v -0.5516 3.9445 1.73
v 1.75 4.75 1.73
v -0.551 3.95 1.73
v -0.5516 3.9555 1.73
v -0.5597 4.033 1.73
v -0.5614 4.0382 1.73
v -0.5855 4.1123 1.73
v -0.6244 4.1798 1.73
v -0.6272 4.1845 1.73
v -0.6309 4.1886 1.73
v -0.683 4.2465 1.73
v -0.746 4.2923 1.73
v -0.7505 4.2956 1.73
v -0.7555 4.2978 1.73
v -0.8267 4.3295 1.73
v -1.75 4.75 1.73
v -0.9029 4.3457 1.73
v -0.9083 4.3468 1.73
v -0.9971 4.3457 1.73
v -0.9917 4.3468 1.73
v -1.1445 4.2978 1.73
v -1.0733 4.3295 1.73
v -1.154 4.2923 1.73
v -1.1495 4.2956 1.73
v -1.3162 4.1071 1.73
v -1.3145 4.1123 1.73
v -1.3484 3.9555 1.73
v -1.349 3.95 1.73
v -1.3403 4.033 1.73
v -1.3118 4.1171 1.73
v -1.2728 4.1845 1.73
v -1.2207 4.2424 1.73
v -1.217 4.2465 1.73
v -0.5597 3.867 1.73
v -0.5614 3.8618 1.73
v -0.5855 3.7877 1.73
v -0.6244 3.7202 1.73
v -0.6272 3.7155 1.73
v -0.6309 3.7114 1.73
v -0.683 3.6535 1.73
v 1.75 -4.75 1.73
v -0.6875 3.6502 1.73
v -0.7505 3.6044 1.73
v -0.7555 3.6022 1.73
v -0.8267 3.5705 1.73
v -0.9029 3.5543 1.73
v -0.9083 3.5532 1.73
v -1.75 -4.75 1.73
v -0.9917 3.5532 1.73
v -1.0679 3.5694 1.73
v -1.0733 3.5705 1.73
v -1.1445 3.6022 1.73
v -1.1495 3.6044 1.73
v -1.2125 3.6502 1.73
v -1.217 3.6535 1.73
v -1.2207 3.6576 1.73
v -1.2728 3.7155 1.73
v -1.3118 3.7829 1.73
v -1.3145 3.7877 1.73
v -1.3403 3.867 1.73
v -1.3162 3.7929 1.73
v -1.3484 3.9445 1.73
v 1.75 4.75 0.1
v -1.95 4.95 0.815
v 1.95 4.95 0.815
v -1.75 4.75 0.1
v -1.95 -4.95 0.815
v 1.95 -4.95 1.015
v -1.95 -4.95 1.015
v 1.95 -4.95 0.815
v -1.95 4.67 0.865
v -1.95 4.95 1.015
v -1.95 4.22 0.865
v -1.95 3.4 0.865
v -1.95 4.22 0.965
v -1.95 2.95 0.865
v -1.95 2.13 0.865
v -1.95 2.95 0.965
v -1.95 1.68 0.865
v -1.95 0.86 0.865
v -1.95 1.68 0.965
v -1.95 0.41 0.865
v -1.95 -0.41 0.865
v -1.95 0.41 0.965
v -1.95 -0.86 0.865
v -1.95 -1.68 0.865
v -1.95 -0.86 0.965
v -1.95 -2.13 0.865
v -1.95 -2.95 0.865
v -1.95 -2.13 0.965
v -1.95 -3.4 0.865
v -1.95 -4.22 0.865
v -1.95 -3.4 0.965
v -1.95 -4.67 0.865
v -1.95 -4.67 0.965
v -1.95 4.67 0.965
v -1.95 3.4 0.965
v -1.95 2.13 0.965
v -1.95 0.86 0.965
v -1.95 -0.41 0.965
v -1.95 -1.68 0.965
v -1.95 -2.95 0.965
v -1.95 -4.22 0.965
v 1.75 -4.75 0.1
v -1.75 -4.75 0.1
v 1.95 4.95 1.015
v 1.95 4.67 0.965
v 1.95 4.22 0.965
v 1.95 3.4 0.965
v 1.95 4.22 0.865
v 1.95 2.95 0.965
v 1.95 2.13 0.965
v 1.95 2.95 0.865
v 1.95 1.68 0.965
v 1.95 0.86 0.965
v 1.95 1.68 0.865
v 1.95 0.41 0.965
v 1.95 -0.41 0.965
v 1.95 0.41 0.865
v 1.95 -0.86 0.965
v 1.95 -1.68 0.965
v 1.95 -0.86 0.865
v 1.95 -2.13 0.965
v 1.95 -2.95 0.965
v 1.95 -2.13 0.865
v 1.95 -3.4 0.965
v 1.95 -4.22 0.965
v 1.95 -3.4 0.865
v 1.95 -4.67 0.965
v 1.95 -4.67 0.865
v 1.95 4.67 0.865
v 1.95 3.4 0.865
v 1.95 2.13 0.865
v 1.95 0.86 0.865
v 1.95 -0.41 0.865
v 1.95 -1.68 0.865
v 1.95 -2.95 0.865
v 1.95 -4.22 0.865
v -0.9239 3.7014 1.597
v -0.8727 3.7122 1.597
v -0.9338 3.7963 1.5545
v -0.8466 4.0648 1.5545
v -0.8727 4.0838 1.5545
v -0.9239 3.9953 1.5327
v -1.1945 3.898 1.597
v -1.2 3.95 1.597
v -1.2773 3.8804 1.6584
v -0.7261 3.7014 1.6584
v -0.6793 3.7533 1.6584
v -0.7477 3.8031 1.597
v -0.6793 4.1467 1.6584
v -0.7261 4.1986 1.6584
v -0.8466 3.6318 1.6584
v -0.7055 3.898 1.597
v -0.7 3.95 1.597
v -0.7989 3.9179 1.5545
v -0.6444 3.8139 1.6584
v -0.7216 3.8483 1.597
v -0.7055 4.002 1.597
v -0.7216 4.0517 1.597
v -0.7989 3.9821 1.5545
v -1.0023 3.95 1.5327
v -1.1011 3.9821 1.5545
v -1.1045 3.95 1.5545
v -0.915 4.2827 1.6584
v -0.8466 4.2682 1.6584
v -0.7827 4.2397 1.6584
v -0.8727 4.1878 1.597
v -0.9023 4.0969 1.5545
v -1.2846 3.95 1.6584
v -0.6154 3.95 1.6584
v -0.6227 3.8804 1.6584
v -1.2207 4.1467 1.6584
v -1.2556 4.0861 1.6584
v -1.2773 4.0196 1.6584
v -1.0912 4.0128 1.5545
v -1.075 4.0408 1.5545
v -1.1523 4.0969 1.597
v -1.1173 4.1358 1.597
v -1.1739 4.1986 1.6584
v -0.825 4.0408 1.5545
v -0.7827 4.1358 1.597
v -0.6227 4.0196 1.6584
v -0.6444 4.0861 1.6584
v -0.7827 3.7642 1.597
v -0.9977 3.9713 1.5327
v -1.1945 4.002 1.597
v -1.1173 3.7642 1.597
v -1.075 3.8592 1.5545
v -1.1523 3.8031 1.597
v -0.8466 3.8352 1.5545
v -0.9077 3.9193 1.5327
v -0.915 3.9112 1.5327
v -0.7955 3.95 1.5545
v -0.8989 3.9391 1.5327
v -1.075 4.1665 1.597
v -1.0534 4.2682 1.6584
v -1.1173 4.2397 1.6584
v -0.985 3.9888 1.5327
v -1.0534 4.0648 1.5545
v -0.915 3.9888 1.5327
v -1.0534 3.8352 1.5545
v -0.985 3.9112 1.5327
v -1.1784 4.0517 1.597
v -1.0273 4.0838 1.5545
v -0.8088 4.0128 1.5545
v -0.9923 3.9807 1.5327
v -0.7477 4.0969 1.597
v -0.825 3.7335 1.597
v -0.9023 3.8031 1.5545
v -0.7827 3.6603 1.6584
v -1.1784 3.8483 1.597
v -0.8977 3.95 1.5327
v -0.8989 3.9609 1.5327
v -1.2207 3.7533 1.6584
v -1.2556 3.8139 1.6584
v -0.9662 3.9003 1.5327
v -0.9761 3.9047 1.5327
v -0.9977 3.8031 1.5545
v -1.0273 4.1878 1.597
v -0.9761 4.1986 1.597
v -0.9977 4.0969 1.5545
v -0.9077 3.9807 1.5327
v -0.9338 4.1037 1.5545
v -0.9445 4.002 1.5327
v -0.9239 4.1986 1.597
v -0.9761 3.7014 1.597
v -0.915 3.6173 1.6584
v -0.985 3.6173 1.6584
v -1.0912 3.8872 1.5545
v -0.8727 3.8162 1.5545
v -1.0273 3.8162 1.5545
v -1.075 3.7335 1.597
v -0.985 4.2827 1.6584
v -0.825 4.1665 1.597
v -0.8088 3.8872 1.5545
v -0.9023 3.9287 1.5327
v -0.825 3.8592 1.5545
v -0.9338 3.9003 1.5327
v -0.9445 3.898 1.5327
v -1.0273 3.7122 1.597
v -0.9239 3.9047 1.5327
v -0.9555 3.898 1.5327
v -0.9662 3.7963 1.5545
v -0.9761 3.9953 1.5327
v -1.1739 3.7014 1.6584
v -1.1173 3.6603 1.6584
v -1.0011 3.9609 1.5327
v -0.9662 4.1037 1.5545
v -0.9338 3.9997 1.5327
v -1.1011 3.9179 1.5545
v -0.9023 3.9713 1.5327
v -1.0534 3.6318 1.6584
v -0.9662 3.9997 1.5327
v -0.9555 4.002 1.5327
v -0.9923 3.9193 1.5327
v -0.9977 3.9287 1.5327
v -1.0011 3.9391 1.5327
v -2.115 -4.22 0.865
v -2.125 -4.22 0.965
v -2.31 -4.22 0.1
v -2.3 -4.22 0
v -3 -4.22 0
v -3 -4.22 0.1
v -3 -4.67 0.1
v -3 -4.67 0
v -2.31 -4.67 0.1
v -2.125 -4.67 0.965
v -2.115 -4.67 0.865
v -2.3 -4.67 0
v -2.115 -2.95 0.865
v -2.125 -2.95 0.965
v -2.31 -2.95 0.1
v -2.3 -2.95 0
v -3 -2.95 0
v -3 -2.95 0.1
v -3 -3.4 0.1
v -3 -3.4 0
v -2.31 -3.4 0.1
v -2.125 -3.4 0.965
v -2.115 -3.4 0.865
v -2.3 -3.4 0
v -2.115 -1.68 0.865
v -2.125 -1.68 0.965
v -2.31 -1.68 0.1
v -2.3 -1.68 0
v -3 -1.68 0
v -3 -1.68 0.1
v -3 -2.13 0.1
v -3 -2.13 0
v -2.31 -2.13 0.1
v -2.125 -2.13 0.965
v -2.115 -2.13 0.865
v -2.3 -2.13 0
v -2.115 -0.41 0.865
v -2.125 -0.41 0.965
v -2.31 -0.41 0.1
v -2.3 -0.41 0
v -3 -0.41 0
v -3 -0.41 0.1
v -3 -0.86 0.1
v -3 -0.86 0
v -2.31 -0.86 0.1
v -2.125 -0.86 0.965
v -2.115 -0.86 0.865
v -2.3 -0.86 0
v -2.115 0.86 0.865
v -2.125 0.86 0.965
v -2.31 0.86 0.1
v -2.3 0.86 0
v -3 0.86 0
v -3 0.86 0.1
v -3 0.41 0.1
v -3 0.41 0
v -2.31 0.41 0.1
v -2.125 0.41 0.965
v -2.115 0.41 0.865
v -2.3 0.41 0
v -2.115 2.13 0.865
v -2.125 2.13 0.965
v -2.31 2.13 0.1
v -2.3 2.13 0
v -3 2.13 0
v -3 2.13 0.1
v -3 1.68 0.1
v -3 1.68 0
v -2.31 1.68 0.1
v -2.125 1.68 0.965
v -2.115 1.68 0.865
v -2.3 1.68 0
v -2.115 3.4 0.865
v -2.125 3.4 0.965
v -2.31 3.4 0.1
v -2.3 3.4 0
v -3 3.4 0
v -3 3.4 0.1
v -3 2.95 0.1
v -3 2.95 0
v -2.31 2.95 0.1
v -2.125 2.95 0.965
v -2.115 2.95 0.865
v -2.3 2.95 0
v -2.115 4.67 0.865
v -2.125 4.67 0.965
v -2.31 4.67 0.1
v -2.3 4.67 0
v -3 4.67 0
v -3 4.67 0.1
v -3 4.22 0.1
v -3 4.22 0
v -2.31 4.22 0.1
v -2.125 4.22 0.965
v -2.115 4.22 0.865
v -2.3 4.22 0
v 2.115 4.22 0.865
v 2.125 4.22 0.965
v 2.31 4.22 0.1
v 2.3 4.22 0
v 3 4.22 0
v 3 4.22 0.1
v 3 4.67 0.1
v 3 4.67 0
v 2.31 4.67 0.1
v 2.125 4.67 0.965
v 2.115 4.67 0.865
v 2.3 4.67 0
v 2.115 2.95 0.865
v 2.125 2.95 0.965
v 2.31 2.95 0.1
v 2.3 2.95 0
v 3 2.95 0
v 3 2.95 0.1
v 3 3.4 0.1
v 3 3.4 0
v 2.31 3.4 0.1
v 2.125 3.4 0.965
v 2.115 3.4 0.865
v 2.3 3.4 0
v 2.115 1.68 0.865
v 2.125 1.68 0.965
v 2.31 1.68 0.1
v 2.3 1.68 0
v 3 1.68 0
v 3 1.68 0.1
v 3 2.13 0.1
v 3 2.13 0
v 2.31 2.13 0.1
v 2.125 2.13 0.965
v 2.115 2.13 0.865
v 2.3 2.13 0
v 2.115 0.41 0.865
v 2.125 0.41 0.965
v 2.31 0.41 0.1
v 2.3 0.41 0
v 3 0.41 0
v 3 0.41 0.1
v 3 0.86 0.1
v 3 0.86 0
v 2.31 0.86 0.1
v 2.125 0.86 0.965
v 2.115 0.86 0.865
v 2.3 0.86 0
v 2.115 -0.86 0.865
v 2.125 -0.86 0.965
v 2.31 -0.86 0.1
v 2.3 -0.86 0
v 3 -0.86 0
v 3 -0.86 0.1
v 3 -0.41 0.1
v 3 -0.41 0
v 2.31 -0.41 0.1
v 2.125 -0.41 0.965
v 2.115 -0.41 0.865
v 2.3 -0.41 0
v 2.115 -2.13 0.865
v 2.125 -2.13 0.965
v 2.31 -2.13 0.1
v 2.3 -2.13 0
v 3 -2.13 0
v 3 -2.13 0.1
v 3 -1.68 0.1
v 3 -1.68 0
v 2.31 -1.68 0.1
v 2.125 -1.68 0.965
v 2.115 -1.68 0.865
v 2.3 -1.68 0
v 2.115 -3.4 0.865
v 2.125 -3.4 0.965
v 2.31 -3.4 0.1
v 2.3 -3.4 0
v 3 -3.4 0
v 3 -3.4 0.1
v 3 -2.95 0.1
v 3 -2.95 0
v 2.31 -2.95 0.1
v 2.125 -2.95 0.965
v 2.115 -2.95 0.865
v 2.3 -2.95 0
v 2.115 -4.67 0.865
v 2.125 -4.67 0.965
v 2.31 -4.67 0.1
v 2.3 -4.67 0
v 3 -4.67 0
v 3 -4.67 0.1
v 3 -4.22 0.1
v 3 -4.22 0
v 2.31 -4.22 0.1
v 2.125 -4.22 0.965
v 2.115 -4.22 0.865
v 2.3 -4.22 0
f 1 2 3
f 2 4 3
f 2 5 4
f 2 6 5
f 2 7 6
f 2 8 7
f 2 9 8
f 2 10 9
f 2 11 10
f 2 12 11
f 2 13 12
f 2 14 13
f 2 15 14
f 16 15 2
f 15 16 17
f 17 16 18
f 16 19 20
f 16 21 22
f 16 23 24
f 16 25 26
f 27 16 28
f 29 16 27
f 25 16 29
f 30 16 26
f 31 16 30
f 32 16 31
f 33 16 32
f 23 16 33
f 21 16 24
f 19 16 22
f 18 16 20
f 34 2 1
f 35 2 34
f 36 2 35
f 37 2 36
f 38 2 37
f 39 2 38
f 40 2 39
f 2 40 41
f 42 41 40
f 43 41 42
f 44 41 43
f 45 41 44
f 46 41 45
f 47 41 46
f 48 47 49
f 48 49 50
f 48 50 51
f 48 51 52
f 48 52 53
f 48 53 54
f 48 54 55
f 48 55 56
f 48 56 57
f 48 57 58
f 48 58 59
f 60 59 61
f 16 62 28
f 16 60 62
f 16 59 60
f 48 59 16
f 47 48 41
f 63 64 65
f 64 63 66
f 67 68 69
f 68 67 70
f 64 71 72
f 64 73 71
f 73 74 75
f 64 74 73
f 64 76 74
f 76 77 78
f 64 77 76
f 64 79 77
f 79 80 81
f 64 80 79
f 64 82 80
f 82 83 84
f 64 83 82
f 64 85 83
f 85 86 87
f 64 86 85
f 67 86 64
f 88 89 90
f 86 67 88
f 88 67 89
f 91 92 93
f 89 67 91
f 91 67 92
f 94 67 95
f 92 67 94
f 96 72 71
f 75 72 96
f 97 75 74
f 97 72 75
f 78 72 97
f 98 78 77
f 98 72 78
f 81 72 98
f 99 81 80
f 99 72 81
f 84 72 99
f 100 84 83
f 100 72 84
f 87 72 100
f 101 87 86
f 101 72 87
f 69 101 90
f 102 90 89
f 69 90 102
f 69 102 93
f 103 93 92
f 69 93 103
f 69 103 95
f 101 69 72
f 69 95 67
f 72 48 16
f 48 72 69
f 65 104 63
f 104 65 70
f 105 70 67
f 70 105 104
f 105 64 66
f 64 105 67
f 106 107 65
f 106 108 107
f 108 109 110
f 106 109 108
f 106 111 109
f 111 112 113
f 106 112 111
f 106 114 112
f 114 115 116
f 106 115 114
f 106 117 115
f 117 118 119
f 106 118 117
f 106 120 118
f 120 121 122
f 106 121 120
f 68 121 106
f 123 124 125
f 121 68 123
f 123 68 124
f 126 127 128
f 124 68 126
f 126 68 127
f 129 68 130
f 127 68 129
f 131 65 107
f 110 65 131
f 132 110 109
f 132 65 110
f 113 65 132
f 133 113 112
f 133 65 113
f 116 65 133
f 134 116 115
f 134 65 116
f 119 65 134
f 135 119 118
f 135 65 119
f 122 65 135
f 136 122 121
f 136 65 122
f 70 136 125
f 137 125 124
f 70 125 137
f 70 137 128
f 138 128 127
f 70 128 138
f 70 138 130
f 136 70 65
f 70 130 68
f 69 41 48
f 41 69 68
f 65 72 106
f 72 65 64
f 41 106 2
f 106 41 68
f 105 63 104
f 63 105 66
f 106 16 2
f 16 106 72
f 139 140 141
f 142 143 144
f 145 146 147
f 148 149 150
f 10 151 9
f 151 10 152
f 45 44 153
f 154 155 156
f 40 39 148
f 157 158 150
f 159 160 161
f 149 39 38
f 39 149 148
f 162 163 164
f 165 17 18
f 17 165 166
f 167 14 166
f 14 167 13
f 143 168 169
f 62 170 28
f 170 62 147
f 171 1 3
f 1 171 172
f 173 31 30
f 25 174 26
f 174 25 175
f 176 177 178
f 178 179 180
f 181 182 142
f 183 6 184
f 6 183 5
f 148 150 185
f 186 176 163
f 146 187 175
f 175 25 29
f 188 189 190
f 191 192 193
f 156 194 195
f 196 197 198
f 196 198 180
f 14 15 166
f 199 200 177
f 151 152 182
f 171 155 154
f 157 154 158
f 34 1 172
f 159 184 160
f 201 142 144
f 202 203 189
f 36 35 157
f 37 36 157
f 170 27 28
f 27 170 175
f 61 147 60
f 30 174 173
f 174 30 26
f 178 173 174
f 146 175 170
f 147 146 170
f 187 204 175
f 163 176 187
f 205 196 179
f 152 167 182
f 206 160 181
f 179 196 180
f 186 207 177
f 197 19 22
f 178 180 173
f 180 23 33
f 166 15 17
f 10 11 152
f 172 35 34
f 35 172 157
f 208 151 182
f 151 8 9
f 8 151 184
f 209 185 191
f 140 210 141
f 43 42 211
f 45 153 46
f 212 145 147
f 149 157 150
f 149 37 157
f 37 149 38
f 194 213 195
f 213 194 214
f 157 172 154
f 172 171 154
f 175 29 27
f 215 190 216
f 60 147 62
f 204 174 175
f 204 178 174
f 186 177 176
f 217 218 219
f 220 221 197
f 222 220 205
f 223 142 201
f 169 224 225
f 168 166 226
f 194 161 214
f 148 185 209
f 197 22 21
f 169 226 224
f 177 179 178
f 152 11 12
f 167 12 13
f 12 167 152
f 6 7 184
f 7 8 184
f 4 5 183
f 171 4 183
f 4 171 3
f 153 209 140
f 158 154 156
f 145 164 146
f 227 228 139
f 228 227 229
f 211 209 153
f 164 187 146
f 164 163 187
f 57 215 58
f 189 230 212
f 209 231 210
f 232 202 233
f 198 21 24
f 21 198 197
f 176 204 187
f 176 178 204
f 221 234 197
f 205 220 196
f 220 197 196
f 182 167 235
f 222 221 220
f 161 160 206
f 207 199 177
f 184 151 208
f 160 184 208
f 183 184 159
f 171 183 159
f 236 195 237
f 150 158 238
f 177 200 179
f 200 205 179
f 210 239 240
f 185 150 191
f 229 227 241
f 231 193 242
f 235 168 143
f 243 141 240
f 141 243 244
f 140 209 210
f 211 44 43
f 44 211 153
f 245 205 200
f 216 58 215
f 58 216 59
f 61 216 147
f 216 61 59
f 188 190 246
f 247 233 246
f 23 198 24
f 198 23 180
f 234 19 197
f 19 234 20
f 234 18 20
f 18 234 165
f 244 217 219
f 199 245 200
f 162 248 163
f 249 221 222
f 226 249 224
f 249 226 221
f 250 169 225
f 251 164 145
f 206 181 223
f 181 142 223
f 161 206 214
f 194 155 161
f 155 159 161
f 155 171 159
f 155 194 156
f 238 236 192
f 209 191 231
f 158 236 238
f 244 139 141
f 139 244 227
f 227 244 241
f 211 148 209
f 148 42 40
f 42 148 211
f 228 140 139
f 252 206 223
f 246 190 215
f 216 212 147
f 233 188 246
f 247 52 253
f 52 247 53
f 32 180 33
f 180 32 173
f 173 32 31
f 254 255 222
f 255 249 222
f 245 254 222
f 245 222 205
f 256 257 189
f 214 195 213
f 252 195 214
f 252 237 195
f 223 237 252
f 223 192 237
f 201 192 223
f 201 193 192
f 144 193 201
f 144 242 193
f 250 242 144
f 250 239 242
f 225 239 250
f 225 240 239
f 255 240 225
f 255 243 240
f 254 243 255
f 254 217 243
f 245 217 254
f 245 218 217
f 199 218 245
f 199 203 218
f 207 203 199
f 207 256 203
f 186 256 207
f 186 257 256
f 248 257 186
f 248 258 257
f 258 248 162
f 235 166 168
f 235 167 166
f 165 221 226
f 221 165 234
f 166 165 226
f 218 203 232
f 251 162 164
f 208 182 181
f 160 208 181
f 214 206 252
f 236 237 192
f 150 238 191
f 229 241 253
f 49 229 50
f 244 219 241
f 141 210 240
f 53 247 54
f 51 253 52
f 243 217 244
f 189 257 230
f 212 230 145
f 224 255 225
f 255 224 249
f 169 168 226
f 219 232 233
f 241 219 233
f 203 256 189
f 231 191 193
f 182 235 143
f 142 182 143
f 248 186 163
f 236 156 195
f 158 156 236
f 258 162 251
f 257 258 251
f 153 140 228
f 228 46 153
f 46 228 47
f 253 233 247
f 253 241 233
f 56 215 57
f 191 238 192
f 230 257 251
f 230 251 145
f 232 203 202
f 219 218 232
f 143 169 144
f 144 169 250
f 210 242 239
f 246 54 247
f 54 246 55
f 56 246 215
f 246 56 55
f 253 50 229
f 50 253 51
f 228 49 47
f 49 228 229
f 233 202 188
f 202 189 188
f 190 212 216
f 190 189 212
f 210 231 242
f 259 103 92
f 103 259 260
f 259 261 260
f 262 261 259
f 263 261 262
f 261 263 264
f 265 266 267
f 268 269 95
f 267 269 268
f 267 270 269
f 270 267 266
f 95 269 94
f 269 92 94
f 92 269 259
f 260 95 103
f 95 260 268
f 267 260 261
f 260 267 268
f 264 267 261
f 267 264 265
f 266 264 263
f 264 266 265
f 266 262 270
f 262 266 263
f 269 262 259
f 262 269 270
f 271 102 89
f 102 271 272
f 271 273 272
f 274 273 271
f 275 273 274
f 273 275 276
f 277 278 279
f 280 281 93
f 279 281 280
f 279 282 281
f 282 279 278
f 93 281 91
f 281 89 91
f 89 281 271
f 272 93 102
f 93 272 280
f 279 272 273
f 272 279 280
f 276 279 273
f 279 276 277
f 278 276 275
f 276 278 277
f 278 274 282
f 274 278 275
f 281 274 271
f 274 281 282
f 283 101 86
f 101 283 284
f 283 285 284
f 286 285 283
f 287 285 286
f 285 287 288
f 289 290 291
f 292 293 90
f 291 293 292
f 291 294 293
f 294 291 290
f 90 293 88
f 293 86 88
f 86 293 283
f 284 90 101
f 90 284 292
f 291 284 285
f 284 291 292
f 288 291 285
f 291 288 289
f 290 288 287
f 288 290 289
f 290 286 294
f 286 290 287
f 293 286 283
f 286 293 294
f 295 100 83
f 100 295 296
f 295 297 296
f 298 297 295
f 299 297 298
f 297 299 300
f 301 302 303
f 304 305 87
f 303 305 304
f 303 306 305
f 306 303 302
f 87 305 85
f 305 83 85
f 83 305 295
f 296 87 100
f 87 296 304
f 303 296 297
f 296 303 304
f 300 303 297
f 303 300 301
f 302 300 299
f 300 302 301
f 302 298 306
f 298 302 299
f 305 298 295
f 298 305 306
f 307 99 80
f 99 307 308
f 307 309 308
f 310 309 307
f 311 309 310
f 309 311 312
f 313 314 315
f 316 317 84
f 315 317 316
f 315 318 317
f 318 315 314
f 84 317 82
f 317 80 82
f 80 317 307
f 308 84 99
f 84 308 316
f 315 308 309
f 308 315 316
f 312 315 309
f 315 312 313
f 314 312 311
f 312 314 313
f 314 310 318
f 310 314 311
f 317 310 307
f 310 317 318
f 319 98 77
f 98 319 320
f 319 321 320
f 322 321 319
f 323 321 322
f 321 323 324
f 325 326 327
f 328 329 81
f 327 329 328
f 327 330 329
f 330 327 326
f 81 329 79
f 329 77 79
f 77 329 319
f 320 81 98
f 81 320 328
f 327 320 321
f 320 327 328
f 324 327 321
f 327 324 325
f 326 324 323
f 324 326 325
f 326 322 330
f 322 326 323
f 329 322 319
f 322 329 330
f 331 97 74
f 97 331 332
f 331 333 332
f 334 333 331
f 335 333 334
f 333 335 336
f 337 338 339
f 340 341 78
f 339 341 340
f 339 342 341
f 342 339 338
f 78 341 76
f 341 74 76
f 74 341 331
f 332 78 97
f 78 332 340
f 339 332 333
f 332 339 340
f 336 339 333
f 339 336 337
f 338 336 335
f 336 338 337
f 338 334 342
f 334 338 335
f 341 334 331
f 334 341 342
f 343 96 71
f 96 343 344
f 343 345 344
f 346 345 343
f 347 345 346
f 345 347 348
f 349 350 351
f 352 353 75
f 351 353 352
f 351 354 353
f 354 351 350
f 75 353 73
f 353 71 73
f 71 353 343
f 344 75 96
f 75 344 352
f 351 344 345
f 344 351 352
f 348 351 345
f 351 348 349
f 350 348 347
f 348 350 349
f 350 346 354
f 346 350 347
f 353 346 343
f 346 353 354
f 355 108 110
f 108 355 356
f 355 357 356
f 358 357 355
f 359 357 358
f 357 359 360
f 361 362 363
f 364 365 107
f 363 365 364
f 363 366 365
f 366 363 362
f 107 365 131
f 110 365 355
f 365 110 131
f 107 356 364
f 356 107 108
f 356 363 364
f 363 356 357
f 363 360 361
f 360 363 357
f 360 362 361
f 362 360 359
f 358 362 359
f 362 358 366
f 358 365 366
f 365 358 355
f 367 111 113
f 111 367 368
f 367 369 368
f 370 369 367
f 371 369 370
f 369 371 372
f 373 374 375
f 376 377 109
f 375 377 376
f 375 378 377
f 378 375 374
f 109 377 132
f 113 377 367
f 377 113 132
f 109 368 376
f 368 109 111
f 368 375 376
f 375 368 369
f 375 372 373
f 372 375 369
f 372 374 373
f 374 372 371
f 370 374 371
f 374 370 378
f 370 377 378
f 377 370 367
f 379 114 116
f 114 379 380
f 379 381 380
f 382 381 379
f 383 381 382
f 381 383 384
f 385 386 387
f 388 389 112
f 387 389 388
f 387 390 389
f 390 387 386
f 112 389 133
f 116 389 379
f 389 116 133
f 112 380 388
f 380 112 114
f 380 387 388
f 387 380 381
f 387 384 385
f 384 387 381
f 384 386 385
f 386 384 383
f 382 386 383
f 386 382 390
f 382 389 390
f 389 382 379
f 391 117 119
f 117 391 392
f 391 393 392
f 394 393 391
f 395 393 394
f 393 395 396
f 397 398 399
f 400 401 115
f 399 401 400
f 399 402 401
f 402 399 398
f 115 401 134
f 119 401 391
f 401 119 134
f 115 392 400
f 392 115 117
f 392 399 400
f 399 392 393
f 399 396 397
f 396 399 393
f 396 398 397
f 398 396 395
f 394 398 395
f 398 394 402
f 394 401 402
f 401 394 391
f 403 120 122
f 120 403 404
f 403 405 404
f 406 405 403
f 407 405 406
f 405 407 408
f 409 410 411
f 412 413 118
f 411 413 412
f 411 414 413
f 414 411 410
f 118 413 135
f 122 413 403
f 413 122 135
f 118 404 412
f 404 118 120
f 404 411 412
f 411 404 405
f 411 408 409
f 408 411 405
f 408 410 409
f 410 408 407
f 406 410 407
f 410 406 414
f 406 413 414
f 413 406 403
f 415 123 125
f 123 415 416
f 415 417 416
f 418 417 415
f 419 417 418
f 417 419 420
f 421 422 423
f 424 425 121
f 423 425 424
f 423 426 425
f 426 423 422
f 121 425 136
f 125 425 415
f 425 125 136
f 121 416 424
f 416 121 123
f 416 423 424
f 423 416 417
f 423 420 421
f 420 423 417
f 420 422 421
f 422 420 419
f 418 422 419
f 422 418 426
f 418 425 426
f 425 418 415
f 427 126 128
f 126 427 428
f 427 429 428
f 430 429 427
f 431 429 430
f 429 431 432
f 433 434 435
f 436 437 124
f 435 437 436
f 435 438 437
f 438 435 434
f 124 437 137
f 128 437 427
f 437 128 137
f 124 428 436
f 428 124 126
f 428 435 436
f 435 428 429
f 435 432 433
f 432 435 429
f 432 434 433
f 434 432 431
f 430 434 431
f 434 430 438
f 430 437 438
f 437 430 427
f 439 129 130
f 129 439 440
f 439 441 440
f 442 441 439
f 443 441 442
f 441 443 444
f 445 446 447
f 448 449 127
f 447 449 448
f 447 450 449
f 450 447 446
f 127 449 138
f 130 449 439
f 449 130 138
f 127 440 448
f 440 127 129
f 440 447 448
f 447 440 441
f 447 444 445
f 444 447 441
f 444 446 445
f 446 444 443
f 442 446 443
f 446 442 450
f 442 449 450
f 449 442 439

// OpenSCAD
// file: proto/soic.scad
/*
OpenSCAD Model:  Small Outline IC

  N  - number of pins
  L  - width, including pads
  P  - pitch
  W  - width of pad
  H  - total height
  T  - toe length
  A  - body width
  B  - body height
  K  - elevation
  padcolor - color of pads
  bodycolor - color of plastic body
  simple - 0 = realistic model, 1 = simplified model

*/

module soic(
	N=14,
	L=6.4,
	P=0.65,
	W=0.25,
	H=1.2,
	T=0.624,
	A=4.4,
	B=5,
	K=0.1,
	padcolor=[0.9,0.9,0.9],
	bodycolor=[0.2,0.2,0.2],
	simple=0
) {

	module soicpadblock(n)	{
		x=0.01;
		color(padcolor) for (i=[0:n-1]) {
			translate ([0,-(n-1)/2*P+i*P+W/2,0])  rotate(90,[1,0,0]) linear_extrude(height=W) polygon(
				[[0,0],[0,0.1],[T-x,0.1],[T+((L-A)/2-T)/2,(H-K)/2+0.05+K],[(L-A)/2+0.05,(H-K)/2+0.05+K],
				 [(L-A)/2+0.05,(H-K)/2-0.05+K],[T+((L-A)/2-T)/2+x,(H-K)/2-0.05+K],[T,0]]
			);
		}
	}

	color(bodycolor) {
		translate([0,0,(H-K)/2+K]) {
			difference() {
			if (simple) {
				cube([A,B,H-K],center=true);
			} else {
				polyhedron(
					[[-A/2+0.2,B/2-0.2,(H-K)/2],[A/2-0.2,B/2-0.2,(H-K)/2],[A/2-0.2,-B/2+0.2,(H-K)/2],[-A/2+0.2,-B/2+0.2,(H-K)/2],
					 [-A/2,B/2,0.1],[A/2,B/2,0.1],[A/2,-B/2,0.1],[-A/2,-B/2,0.1],
					 [-A/2,B/2,-0.1],[A/2,B/2,-0.1],[A/2,-B/2,-0.1],[-A/2,-B/2,-0.1],
					 [-A/2+0.2,B/2-0.2,-(H-K)/2],[A/2-0.2,B/2-0.2,-(H-K)/2],[A/2-0.2,-B/2+0.2,-(H-K)/2],[-A/2+0.2,-B/2+0.2,-(H-K)/2]],
					[
					[0,1,2],[2,3,0],[14,13,12],[12,15,14],
					[0,4,5],[5,1,0],[1,5,6],[6,2,1],[2,6,7],[7,3,2],[3,7,4],[4,0,3],
					[4,8,9],[9,5,4],[5,9,10],[10,6,5],[6,10,11],[11,7,6],[11,8,4],[4,7,11],
					[8,12,13],[13,9,8],[9,13,14],[14,10,9],[10,14,15],[15,11,10],[11,15,12],[12,8,11],
					]
				);
			}
			translate([-A/2+1,B/2-1,(H-K)/2+0.3]) sphere(r=0.5,$fn=30);
			}
		}
	}

	translate([-L/2,0,0]) soicpadblock(N/2);
	translate([L/2,0,0]) rotate(180,[0,0,1]) soicpadblock(N/2);
}
// main file
include <proto/soic.scad>

soic(
	N=16,
	L=6.0,
	P=1.27,
	W=0.45,
	H=1.73,
	T=0.7,
	A=3.9,
	B=9.9,
	K=0.1
);
